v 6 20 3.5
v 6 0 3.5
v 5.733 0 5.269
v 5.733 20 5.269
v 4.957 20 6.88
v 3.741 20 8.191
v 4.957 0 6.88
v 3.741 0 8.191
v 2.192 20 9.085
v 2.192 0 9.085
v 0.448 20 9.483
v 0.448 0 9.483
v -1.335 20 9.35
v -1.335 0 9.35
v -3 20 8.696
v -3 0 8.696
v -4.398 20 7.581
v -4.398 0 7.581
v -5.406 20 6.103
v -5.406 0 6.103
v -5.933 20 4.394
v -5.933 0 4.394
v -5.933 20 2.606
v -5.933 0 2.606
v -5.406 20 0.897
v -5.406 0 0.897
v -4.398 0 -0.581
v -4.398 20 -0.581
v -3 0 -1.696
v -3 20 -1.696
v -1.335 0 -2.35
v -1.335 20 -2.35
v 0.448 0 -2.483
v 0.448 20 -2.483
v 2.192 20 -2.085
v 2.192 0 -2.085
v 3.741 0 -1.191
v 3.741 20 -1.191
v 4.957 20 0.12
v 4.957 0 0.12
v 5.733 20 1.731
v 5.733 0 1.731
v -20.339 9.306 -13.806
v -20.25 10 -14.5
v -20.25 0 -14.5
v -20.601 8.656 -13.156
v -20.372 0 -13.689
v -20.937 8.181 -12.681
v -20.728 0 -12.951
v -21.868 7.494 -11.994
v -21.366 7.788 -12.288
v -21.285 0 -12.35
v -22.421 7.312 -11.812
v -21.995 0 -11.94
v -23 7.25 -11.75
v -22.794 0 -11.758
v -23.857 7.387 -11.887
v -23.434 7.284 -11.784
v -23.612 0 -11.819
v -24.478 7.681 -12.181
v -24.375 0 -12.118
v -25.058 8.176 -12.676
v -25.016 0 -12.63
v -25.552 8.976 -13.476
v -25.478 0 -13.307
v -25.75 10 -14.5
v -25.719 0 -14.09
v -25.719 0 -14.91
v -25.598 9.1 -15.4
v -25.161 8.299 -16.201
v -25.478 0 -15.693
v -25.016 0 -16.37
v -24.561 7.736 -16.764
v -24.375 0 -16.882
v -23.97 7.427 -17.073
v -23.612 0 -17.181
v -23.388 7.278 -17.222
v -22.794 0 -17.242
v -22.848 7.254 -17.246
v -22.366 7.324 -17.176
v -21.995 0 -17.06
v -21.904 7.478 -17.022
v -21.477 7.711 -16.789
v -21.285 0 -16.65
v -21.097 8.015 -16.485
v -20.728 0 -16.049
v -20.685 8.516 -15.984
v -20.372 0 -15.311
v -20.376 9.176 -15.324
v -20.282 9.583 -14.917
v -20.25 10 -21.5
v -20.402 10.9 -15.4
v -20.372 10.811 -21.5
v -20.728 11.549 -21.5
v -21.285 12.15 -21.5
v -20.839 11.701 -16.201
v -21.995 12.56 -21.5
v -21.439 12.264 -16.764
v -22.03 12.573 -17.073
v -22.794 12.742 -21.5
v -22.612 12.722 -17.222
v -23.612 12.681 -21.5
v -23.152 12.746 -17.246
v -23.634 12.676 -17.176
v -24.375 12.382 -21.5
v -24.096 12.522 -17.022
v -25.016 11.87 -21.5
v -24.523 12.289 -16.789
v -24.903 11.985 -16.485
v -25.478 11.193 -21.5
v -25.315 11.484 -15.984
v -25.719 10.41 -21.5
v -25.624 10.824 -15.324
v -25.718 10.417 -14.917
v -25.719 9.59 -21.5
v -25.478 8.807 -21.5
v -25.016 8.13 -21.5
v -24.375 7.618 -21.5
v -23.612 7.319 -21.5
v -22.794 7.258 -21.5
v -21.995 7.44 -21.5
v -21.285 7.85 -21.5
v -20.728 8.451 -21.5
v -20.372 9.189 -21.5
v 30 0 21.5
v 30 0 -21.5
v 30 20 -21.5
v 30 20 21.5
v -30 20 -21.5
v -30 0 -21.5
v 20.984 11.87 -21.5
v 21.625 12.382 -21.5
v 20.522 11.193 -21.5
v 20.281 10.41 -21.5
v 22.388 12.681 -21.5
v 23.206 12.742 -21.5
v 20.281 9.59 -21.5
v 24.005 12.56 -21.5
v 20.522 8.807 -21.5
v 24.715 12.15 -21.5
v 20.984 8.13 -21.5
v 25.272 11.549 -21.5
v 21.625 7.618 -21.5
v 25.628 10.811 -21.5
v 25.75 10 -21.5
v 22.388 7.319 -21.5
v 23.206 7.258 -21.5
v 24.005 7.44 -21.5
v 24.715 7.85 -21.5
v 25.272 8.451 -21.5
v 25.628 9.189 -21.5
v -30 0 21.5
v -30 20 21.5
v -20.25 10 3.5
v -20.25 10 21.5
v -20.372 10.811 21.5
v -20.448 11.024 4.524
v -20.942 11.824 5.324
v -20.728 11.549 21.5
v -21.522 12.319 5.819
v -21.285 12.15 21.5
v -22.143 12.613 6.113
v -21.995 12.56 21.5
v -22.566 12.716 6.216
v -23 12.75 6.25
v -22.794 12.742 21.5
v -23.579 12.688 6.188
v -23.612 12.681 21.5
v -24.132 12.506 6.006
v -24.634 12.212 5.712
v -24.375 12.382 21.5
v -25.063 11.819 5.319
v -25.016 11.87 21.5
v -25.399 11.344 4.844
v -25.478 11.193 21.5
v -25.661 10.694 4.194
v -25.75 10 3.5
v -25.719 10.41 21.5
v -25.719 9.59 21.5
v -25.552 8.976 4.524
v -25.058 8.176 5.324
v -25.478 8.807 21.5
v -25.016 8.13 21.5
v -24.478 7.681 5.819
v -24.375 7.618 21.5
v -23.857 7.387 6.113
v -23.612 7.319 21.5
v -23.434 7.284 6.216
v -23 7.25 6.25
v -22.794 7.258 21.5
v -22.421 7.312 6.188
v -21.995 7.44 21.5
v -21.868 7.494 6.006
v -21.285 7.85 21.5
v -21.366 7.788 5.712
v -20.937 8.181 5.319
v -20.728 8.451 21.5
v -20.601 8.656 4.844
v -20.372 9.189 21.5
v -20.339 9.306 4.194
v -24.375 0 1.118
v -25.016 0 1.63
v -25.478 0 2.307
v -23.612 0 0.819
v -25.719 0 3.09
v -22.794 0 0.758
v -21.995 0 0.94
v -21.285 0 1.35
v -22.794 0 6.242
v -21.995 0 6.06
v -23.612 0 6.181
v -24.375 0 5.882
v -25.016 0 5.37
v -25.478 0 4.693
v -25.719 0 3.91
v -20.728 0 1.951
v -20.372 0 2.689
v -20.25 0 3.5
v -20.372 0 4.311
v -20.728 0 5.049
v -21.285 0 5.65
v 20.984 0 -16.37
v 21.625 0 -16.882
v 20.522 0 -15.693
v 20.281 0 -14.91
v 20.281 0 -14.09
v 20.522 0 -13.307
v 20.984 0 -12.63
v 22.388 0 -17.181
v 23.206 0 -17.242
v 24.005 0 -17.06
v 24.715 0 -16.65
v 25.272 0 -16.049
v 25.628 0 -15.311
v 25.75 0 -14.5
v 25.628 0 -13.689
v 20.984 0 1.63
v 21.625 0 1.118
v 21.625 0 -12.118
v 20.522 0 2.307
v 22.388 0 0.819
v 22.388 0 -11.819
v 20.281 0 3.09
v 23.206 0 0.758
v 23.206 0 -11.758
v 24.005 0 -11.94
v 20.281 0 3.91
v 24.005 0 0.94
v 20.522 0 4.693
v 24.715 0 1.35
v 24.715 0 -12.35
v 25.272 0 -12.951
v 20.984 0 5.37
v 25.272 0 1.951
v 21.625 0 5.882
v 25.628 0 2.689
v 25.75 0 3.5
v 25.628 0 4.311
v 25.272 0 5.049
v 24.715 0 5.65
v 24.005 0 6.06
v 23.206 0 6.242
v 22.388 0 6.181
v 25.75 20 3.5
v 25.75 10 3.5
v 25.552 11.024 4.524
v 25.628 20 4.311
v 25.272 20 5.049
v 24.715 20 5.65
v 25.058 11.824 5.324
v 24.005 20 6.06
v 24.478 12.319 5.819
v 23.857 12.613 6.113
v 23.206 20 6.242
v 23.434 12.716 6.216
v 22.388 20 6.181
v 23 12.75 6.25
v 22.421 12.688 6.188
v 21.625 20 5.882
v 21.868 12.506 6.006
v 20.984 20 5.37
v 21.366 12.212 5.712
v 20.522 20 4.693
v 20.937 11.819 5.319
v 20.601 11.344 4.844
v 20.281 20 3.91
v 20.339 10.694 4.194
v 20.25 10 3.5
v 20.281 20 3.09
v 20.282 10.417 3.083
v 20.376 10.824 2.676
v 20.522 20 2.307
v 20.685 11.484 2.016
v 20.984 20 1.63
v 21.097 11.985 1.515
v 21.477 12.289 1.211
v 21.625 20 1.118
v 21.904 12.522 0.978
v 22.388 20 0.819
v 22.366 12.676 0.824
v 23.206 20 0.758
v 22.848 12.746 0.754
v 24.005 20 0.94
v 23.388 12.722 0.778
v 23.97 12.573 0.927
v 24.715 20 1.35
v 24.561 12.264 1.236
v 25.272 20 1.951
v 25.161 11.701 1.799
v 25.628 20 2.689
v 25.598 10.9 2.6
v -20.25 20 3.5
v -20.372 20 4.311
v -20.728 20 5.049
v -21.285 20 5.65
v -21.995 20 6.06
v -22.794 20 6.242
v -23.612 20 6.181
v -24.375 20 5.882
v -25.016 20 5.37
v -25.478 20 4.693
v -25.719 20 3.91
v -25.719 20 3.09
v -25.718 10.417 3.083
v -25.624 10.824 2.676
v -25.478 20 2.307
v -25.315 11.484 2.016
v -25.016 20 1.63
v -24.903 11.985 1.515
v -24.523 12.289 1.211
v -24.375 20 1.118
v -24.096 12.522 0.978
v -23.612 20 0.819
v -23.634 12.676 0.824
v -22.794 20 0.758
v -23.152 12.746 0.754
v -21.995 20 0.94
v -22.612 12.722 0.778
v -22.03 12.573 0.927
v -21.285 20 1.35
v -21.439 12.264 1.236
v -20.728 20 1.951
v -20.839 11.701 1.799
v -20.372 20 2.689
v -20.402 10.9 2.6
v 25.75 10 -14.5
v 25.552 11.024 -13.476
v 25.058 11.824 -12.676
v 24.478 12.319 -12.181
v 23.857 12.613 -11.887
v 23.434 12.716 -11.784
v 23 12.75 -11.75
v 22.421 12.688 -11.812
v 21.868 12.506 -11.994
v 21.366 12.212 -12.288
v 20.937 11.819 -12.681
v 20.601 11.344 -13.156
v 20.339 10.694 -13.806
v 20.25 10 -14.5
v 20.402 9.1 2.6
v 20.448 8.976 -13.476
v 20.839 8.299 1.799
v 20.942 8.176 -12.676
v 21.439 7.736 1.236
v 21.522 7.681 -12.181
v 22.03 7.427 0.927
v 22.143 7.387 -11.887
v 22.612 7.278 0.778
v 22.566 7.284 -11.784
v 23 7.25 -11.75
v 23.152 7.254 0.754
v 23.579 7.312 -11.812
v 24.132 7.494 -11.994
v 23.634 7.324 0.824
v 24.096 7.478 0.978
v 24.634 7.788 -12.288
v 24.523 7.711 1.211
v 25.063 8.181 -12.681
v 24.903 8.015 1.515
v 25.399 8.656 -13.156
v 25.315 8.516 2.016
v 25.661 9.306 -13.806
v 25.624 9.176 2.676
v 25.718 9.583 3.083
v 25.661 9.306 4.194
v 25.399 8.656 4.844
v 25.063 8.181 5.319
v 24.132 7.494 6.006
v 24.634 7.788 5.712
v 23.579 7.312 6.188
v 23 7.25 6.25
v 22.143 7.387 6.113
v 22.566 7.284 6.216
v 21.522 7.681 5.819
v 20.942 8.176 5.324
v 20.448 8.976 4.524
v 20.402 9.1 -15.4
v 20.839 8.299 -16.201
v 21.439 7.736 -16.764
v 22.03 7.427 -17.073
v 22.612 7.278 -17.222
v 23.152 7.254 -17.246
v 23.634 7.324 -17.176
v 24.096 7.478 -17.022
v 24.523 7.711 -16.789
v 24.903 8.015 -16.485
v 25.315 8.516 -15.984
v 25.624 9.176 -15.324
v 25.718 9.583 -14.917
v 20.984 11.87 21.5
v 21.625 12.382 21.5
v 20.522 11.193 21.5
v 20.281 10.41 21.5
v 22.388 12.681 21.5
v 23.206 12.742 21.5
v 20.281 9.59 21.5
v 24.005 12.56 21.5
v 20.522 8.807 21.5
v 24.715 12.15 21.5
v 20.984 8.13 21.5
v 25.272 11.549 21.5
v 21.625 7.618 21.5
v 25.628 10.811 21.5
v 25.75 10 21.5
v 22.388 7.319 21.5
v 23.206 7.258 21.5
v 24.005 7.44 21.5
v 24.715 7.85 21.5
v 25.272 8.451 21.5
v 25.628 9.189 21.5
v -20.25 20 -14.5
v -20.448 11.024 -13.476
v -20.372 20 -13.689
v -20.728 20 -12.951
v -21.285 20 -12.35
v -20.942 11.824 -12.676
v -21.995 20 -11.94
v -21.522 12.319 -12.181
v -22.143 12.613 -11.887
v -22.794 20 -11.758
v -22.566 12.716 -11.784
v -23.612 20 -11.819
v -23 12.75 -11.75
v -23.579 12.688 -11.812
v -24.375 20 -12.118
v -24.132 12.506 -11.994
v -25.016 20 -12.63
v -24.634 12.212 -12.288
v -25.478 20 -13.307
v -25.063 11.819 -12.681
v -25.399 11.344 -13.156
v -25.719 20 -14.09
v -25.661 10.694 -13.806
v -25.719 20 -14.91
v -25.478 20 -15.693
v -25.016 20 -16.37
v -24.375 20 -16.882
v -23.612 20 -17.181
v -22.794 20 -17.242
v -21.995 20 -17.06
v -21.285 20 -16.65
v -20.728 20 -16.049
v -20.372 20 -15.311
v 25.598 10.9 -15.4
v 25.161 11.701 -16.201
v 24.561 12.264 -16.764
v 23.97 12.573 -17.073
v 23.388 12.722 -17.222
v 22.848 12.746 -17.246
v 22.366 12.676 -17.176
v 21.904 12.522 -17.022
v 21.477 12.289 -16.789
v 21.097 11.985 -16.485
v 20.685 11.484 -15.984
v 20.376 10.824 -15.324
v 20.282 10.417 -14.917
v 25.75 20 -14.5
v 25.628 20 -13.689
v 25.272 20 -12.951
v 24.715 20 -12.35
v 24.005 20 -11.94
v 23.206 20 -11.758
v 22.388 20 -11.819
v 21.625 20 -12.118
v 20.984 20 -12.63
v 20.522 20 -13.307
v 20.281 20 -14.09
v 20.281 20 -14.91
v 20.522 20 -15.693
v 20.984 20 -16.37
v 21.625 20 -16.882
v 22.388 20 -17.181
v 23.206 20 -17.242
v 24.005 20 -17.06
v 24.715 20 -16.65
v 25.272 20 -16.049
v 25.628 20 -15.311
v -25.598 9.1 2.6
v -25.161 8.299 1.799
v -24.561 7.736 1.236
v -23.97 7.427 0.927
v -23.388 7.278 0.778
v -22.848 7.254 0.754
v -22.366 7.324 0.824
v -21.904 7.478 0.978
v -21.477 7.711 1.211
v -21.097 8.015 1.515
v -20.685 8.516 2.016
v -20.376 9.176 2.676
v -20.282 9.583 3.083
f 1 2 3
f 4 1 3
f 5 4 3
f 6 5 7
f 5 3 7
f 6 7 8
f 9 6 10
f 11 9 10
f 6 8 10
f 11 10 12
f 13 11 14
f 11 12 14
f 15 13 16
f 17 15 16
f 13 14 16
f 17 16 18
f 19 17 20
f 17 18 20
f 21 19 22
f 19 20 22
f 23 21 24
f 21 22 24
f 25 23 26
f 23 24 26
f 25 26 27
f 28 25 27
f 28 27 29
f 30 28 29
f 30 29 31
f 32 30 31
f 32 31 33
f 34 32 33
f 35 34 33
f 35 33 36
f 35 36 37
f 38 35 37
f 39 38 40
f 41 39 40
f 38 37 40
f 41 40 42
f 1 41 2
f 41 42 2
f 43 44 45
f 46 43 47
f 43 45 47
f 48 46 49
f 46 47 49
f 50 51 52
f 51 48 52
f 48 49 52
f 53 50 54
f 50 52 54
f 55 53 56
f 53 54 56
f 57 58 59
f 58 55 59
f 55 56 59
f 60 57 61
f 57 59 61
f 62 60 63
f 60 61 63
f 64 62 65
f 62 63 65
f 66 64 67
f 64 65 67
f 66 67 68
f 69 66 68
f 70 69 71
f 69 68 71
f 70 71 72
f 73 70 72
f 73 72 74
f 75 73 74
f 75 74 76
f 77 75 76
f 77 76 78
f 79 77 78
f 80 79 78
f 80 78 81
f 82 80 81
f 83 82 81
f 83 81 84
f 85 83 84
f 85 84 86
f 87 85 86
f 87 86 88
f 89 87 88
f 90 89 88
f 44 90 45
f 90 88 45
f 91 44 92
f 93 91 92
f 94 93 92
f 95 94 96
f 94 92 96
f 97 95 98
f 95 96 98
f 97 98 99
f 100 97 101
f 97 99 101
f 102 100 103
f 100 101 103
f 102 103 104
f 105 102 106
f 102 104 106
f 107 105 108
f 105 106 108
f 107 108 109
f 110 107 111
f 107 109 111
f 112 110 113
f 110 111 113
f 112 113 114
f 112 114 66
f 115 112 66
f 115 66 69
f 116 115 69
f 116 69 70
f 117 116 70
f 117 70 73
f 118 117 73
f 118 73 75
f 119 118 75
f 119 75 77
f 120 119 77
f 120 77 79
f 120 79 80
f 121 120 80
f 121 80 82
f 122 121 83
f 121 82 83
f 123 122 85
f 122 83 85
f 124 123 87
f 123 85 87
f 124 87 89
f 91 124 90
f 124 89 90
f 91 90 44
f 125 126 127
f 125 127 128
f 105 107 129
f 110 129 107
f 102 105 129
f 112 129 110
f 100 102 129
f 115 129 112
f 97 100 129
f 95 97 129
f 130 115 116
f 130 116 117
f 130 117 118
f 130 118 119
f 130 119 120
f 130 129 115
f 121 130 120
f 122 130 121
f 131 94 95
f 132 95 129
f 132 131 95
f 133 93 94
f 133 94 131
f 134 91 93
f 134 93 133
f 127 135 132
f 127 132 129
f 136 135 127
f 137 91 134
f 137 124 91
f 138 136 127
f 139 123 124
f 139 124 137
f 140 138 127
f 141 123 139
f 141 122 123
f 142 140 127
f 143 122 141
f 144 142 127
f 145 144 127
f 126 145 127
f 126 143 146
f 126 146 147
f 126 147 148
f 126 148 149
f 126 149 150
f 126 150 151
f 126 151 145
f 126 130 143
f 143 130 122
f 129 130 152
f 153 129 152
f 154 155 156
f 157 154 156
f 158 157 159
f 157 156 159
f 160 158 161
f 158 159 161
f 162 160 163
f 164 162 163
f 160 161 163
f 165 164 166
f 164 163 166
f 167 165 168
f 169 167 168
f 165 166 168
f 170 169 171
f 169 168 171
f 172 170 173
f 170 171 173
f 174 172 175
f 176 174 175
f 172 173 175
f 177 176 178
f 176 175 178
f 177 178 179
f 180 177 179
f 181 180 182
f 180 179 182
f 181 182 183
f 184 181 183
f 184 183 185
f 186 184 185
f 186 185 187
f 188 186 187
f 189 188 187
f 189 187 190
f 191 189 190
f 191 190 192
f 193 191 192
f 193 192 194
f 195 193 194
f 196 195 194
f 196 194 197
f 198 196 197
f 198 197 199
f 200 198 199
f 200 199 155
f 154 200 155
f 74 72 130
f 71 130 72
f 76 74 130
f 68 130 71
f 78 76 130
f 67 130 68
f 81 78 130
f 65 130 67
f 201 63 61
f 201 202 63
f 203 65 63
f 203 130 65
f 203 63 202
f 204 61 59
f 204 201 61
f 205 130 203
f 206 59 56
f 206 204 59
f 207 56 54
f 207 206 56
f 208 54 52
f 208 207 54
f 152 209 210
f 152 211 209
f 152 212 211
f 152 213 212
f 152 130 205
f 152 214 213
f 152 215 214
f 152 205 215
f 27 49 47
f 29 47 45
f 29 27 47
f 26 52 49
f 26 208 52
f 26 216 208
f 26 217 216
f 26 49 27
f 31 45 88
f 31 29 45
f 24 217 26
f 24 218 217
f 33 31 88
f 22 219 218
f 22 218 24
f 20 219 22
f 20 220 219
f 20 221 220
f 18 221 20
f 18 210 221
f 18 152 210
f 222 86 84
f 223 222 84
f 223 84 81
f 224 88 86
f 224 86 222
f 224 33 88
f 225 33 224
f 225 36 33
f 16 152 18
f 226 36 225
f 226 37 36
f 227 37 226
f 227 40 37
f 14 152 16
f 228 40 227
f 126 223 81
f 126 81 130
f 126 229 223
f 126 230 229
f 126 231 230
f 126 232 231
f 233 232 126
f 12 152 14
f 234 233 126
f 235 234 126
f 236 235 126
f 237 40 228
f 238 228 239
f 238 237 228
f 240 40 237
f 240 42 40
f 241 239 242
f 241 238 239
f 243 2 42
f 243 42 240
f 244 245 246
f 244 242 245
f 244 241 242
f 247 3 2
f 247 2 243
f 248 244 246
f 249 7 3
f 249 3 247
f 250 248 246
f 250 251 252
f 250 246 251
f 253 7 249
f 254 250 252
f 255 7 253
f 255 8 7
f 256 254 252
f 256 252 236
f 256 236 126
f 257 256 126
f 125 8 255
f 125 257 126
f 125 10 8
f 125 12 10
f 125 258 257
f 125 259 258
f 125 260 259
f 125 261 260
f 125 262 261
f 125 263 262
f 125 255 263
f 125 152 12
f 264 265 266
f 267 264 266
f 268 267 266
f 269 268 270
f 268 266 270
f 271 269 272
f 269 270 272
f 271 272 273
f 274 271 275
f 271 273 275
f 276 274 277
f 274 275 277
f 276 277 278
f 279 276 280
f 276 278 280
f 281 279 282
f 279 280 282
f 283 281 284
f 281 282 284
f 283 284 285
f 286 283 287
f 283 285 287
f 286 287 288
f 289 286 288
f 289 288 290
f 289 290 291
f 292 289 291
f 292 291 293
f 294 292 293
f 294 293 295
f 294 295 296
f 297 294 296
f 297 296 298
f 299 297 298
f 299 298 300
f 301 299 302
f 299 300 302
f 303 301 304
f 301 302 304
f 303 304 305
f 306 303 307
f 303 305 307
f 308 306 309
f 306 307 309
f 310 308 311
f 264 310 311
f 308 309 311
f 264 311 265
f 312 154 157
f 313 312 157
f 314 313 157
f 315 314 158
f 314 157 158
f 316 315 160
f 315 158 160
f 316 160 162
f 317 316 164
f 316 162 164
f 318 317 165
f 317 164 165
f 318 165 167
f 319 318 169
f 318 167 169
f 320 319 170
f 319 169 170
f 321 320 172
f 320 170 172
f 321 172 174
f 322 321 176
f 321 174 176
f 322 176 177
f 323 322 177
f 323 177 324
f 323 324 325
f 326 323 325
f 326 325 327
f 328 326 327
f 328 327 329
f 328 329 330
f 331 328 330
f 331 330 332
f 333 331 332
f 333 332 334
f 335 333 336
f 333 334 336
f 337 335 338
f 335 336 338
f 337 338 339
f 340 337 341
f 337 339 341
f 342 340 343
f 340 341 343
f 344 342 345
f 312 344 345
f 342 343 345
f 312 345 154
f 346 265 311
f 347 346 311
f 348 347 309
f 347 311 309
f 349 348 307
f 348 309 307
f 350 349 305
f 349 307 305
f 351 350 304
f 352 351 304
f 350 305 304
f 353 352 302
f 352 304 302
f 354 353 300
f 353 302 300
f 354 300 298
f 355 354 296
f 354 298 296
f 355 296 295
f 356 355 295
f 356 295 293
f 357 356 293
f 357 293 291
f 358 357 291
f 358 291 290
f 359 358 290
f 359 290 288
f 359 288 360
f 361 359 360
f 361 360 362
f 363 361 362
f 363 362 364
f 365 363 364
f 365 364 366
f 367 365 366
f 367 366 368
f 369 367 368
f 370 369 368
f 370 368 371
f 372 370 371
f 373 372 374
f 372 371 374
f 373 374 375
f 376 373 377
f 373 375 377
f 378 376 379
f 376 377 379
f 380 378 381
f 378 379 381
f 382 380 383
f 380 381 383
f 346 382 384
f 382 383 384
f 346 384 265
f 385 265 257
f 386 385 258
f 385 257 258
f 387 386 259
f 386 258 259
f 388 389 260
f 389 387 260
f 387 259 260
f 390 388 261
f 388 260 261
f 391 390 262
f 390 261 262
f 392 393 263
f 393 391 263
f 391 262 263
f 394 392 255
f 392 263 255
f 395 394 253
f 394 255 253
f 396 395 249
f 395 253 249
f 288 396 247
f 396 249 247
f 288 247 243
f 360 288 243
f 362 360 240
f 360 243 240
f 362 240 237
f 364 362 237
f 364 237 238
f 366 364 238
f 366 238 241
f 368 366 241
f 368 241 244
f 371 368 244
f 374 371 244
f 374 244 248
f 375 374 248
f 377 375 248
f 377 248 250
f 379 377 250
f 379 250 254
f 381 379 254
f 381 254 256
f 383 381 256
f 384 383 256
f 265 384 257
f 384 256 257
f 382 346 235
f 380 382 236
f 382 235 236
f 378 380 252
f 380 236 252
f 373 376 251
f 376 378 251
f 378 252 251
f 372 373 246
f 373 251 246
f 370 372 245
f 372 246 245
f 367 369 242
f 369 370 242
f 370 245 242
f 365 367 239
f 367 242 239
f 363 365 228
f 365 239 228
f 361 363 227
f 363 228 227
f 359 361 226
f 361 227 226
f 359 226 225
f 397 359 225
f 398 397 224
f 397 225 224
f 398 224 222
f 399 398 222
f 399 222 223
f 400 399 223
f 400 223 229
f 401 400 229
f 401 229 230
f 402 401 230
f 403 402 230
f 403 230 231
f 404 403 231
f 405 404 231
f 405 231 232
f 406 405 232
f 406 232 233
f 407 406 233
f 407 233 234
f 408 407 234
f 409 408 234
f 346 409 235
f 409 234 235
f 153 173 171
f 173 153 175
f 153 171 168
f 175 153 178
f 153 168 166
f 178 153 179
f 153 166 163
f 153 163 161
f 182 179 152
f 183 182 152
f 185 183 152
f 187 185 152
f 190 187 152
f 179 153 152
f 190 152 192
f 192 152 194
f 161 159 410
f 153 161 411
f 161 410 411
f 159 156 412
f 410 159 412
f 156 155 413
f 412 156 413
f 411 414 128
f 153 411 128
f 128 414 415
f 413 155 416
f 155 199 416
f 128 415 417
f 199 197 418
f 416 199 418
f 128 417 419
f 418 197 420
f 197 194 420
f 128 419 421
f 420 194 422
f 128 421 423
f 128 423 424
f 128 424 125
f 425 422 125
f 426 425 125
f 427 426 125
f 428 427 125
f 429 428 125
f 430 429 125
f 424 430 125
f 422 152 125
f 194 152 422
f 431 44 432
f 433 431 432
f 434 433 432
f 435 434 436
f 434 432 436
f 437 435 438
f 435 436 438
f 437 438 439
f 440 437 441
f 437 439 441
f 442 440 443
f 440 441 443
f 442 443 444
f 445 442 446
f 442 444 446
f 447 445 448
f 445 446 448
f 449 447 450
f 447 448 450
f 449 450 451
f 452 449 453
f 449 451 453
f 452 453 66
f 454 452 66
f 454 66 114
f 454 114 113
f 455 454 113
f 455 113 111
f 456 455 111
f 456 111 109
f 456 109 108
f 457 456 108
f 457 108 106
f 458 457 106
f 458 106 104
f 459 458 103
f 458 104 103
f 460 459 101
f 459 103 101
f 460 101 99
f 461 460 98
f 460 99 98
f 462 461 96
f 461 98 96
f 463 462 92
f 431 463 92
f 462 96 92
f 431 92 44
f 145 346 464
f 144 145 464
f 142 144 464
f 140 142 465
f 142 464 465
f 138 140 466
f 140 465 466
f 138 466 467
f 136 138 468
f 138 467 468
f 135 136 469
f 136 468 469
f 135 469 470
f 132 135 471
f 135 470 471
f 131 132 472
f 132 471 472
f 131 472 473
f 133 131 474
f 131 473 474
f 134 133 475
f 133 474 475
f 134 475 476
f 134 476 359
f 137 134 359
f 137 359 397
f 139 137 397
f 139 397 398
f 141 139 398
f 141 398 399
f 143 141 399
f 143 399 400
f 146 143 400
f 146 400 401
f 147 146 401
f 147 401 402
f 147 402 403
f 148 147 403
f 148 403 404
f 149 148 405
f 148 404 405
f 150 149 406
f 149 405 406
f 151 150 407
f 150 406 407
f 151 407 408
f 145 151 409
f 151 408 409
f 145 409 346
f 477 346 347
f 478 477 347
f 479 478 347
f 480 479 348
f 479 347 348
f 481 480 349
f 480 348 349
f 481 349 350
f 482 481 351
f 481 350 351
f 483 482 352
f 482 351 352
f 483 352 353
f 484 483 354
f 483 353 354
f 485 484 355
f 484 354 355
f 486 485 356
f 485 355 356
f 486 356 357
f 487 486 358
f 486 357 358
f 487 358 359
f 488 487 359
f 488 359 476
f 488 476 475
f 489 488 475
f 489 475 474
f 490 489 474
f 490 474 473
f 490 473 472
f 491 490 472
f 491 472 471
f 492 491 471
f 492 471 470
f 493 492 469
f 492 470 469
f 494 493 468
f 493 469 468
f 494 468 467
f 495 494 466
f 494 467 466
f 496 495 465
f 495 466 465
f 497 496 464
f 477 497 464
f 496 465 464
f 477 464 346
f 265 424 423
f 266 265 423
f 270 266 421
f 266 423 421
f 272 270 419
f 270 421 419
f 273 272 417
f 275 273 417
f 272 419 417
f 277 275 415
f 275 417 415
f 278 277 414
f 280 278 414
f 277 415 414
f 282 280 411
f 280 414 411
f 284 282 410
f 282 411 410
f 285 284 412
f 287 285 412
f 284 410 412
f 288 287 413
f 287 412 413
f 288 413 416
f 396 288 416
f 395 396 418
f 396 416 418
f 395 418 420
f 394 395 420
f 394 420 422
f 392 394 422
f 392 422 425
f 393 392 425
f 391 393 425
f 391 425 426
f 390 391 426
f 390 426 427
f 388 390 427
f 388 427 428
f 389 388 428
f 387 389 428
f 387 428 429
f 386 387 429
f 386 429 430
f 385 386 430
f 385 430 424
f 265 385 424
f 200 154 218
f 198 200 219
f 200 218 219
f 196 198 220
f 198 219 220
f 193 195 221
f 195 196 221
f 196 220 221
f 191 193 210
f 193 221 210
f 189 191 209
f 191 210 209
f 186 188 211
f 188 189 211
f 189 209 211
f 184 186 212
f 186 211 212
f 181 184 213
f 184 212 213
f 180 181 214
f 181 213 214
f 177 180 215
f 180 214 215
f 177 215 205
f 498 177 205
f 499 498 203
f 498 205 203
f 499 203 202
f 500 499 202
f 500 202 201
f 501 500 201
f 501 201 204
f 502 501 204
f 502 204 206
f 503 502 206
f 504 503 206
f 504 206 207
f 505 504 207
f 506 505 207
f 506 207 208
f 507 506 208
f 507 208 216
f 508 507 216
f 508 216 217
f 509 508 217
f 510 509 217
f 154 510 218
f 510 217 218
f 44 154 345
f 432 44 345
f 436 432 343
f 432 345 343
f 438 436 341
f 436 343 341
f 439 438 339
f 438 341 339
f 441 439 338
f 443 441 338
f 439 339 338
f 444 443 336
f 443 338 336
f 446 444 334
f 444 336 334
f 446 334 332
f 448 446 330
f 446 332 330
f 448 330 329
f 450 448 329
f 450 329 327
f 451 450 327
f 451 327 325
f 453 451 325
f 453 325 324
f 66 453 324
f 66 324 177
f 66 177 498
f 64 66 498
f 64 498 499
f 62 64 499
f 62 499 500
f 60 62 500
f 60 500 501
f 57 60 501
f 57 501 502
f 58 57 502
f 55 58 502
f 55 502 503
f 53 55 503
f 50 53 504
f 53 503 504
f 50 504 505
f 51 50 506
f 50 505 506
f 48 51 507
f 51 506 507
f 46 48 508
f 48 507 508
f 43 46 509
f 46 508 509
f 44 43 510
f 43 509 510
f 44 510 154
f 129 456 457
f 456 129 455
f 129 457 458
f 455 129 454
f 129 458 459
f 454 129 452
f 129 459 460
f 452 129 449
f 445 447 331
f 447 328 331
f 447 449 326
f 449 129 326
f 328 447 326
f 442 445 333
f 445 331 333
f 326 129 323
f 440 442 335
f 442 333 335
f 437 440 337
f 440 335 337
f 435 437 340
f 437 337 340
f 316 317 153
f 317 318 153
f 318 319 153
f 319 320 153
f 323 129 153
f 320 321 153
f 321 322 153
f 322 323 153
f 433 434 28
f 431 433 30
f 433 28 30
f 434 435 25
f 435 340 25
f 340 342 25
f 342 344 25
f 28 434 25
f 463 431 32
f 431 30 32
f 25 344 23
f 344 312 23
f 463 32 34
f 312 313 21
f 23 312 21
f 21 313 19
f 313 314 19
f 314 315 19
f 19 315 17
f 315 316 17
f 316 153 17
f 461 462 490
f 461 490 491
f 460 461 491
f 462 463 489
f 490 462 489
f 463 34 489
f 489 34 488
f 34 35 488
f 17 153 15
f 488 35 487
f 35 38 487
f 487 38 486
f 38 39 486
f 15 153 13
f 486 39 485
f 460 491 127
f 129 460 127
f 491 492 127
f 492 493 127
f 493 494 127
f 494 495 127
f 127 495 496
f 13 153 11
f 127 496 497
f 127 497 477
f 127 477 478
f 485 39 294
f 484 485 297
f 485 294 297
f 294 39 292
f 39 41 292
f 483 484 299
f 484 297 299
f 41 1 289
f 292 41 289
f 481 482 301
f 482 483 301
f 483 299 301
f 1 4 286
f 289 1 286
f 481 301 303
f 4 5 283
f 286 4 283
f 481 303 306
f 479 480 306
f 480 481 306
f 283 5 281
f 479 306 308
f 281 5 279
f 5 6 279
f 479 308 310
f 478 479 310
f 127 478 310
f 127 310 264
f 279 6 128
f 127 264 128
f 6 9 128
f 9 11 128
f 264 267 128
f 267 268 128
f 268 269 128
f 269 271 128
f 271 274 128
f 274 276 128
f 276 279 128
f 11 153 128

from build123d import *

# Parameters (mm, degrees)
F0_W     = 60
F0_H     = 43
F0_R     = 6
F1_DEPTH = 20
F2_R     = 2.75
F3_DEPTH = 43.001
F4_R     = 2.75
F5_DEPTH = 20.001


with BuildPart() as f1:
    # F0 (on Front) → F1 (new body)
    with BuildSketch(Plane.XZ):
        Rectangle(F0_W, F0_H)
        with Locations((0, 3.5)):
            Circle(F0_R, mode=Mode.SUBTRACT)
    extrude(amount=-F1_DEPTH)

    # F2 (on face) → F3 (cut, through all)
    with BuildSketch(Plane.XY.offset(21.5)):
        with Locations((-23, 10)):
            Circle(F2_R)
        with Locations((23, 10)):
            Circle(F2_R)
    extrude(amount=-F3_DEPTH, mode=Mode.SUBTRACT)

    # F4 (on face) → F5 (cut, through all)
    with BuildSketch(Plane.XZ):
        with Locations((23, 3.5)):
            Circle(F4_R)
        with Locations((-23, -14.5)):
            Circle(F4_R)
        with Locations((23, -14.5)):
            Circle(F4_R)
        with Locations((-23, 3.5)):
            Circle(F4_R)
    extrude(amount=-F5_DEPTH, mode=Mode.SUBTRACT)


solid = f1.part
